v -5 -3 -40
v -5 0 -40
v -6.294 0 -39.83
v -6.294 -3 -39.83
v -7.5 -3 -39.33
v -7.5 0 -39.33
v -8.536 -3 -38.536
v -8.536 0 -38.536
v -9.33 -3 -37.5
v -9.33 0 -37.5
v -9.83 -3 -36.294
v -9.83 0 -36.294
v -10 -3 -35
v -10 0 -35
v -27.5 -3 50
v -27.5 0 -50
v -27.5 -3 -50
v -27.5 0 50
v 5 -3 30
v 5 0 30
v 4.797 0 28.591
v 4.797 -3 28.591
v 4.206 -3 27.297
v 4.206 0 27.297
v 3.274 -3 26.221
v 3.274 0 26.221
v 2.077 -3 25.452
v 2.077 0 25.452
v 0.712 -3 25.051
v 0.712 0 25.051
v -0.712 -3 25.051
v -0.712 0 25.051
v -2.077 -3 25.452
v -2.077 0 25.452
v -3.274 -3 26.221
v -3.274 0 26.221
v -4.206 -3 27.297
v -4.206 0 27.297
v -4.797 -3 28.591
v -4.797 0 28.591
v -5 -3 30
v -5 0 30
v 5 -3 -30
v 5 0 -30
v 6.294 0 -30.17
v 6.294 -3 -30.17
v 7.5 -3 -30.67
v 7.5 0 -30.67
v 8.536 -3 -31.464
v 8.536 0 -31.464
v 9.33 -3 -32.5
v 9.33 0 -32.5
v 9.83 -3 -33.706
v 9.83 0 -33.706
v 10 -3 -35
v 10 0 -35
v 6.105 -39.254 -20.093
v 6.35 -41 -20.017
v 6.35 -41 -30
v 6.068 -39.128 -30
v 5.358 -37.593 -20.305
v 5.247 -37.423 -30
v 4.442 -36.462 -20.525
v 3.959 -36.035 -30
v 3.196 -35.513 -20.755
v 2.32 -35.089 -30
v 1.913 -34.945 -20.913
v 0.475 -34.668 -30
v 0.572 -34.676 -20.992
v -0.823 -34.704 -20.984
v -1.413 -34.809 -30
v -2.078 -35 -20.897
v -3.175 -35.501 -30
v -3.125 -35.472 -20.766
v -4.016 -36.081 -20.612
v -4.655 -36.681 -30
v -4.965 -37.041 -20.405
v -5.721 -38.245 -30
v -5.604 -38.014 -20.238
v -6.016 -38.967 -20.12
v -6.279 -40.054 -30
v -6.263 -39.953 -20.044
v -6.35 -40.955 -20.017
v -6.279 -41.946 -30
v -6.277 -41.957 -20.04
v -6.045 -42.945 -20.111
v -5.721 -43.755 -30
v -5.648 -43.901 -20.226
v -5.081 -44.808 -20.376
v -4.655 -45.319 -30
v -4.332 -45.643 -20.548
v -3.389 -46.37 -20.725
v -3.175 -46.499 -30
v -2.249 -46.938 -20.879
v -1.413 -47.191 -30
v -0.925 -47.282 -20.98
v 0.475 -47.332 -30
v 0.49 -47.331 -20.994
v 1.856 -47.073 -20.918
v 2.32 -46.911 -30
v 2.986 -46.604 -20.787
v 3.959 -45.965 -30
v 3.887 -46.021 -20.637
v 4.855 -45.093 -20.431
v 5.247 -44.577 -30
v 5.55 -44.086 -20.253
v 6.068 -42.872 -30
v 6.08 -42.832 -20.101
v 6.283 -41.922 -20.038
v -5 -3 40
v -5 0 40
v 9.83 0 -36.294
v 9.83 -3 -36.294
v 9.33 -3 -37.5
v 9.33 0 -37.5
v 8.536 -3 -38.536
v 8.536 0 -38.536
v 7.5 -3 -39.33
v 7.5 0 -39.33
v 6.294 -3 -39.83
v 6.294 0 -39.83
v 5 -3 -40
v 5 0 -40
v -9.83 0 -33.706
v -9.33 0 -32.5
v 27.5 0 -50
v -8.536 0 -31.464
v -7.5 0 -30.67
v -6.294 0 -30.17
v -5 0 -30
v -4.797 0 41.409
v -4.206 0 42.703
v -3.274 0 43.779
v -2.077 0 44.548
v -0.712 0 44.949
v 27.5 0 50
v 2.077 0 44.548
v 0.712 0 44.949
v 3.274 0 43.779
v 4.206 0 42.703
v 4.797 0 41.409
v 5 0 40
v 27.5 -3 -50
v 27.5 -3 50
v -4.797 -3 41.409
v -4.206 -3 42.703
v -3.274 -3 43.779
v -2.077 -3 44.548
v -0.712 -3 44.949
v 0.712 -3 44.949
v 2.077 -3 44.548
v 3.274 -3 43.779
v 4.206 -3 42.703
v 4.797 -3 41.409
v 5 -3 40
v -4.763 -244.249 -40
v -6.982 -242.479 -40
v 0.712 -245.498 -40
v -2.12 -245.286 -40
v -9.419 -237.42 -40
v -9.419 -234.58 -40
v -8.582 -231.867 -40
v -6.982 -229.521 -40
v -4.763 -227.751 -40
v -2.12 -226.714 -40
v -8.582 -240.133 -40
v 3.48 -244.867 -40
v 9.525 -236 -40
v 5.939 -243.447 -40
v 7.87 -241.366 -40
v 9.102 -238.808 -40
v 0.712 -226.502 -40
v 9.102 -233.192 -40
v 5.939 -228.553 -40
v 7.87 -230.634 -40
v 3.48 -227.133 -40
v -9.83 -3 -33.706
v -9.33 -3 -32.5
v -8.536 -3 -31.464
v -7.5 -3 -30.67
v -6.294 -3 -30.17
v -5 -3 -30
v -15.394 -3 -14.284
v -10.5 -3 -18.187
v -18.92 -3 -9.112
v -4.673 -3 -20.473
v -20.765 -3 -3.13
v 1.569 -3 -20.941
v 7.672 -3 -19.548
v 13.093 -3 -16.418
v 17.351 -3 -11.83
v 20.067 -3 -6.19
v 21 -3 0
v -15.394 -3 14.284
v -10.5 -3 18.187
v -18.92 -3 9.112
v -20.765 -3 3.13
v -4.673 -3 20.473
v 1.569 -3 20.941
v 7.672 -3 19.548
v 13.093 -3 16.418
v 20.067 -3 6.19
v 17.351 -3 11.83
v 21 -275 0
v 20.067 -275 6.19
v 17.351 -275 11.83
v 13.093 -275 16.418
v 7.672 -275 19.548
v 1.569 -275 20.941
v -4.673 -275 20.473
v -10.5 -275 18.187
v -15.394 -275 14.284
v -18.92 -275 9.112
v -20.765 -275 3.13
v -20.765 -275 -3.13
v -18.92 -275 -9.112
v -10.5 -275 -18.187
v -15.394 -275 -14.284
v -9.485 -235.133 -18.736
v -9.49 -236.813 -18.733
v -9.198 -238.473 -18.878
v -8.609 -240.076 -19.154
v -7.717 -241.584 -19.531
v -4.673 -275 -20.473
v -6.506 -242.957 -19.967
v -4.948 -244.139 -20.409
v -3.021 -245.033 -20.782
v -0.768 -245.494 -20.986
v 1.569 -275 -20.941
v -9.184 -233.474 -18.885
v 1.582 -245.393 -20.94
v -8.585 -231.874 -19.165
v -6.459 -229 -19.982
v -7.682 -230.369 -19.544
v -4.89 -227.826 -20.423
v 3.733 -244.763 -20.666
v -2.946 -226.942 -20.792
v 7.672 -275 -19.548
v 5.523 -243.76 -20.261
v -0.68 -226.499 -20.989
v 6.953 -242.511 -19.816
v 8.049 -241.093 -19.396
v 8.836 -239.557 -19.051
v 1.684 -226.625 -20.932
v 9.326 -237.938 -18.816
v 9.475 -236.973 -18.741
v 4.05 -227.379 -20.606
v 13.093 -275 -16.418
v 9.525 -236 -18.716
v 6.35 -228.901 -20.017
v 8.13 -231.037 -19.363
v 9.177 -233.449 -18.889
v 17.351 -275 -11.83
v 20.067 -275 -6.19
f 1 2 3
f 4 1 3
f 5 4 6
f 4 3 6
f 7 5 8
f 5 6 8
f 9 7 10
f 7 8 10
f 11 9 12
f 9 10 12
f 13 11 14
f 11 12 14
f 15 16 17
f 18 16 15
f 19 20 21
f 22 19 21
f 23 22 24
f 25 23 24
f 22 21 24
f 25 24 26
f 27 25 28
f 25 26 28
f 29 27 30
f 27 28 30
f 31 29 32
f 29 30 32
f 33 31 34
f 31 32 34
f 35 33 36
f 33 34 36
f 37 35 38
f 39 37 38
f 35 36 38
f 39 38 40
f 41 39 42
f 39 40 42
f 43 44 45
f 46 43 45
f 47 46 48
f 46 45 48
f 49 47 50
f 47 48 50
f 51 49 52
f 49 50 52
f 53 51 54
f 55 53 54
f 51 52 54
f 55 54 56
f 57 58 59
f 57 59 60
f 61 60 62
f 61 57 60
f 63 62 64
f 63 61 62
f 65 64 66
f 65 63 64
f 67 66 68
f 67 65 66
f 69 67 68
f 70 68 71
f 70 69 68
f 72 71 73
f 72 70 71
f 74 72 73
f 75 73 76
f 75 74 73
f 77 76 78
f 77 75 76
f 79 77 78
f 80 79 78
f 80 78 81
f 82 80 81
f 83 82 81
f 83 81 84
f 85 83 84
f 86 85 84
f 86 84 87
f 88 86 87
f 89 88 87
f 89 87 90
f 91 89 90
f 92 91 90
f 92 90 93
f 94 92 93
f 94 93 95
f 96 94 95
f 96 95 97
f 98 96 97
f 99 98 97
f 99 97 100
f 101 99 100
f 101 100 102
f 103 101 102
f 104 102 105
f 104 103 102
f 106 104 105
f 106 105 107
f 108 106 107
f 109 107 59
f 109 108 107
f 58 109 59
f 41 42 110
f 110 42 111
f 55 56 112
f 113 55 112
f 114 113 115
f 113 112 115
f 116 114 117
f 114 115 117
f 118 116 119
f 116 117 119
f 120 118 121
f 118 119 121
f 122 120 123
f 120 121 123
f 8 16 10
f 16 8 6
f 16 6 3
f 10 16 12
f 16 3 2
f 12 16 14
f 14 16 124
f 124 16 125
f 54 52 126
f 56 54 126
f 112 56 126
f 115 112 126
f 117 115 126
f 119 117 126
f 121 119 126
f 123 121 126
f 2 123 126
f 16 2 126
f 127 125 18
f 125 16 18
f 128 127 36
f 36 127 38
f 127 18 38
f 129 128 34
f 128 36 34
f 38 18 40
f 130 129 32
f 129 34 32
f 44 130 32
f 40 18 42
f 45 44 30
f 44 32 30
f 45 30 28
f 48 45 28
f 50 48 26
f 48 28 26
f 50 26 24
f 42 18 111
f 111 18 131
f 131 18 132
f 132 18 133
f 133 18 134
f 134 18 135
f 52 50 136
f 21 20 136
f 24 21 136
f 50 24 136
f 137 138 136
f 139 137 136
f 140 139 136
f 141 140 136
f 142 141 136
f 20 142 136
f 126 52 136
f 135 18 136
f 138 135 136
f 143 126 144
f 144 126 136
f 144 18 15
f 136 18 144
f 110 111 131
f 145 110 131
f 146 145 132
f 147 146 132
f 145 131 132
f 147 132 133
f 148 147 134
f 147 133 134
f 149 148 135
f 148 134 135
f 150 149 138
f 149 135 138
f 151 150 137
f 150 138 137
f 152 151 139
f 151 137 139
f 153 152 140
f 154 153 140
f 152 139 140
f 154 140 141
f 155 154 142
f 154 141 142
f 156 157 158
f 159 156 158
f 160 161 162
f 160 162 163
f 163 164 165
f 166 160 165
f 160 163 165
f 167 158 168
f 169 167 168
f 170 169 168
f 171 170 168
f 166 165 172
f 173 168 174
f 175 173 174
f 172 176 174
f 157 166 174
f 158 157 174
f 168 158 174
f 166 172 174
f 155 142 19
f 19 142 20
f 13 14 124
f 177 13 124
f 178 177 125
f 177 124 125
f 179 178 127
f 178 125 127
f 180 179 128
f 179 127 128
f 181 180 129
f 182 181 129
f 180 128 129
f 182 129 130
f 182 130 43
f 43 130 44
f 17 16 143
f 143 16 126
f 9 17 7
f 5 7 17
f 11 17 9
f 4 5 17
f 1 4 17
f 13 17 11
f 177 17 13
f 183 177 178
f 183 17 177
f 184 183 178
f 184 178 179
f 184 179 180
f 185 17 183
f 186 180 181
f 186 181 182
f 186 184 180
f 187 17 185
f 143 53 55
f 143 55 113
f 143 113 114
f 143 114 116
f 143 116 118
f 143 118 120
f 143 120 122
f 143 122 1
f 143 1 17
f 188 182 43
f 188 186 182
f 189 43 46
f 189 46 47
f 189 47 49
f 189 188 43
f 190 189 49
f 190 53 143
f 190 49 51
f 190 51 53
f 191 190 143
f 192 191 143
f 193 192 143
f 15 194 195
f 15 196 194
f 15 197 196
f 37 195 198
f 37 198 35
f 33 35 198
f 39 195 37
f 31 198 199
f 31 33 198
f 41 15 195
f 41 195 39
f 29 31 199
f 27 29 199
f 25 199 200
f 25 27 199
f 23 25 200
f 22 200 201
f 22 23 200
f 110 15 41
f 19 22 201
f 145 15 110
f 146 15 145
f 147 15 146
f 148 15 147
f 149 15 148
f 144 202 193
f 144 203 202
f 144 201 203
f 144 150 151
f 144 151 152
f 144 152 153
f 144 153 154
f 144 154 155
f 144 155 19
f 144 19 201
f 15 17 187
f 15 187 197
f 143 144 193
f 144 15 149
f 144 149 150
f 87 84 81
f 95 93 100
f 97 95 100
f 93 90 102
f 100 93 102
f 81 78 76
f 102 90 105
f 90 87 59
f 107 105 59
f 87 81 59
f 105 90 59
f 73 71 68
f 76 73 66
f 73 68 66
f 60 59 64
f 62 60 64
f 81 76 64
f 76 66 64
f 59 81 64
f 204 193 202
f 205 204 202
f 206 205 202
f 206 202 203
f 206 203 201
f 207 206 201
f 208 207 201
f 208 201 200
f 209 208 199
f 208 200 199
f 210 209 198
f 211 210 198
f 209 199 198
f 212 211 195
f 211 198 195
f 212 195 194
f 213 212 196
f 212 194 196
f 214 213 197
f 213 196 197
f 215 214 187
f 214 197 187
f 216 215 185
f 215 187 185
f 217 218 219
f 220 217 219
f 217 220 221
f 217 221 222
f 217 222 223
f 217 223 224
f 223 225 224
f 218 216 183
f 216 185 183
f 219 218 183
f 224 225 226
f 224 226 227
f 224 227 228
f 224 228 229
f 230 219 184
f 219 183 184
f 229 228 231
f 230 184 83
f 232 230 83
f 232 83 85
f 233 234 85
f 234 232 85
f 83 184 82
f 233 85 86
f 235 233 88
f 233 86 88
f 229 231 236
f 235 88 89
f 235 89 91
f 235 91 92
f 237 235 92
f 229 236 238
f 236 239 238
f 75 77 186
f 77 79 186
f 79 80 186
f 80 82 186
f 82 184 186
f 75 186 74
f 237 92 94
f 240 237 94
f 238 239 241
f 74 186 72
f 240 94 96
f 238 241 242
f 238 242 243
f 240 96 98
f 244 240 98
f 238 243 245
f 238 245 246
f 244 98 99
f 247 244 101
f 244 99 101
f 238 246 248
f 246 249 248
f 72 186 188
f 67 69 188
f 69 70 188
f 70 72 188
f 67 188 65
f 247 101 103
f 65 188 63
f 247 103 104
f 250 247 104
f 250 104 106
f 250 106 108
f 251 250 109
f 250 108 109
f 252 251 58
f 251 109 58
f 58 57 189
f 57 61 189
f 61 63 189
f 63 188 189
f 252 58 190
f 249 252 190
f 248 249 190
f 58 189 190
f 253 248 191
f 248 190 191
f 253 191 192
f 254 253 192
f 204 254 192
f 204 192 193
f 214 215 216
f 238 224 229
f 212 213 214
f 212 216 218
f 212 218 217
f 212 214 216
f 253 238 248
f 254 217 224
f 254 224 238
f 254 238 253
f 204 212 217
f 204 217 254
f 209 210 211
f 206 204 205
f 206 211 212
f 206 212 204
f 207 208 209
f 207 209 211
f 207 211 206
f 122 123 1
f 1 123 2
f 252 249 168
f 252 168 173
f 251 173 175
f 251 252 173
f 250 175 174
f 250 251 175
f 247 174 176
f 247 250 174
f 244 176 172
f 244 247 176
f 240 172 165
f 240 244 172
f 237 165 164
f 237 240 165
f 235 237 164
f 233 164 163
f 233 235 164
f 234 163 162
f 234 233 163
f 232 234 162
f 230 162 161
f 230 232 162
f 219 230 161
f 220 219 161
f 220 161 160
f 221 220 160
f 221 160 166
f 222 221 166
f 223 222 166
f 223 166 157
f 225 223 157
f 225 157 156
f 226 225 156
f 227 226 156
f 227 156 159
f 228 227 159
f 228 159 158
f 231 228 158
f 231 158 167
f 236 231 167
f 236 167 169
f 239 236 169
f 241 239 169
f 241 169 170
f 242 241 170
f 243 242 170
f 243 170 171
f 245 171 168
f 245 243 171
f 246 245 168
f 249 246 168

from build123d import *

# Parameters (mm, degrees)
F0_W     = 55
F0_H     = 100
F1_DEPTH = 3
F2_R     = 21
F3_DEPTH = 272
F4_R     = 6.35
F5_DEPTH = 30
F4_R_2   = 9.525
F6_DEPTH = 40


# Not quite as in the source:
# - a feature names something its author has since deleted; it is built from what else it names


with BuildPart() as f1:
    # F0 (on Front) → F1 (new body)
    with BuildSketch(Plane.XZ):
        Rectangle(F0_W, F0_H)
        with BuildLine():
            ThreePointArc((-10, -35), (-8.5355339059, -31.4644660941), (-5, -30))
            Line((-5, -30), (0, -30))
            Line((0, -30), (5, -30))
            ThreePointArc((5, -30), (8.5355339059, -31.4644660941), (10, -35))
            ThreePointArc((10, -35), (8.5355339059, -38.5355339059), (5, -40))
            Line((5, -40), (0, -40))
            Line((0, -40), (-5, -40))
            ThreePointArc((-5, -40), (-8.5355339059, -38.5355339059), (-10, -35))
        make_face(mode=Mode.SUBTRACT)
        with BuildLine():
            Line((-5, 30), (-5, 40))
            ThreePointArc((-5, 40), (0, 45), (5, 40))
            Line((5, 40), (5, 30))
            ThreePointArc((5, 30), (0, 25), (-5, 30))
        make_face(mode=Mode.SUBTRACT)
    extrude(amount=F1_DEPTH)

    # F2 (on face) → F3 (join)
    with BuildSketch(Plane.XZ.offset(3)):
        Circle(F2_R)
    extrude(amount=F3_DEPTH)

    # F4 (on Top) → F5 (join)
    with BuildSketch(Plane.XY):
        with Locations((0, -41)):
            Circle(F4_R)
    extrude(amount=-F5_DEPTH)

    # F4 (on Top) → F6 (join)
    with BuildSketch(Plane.XY):
        with Locations((0, -236)):
            Circle(F4_R_2)
    extrude(amount=-F6_DEPTH)


solid = f1.part
